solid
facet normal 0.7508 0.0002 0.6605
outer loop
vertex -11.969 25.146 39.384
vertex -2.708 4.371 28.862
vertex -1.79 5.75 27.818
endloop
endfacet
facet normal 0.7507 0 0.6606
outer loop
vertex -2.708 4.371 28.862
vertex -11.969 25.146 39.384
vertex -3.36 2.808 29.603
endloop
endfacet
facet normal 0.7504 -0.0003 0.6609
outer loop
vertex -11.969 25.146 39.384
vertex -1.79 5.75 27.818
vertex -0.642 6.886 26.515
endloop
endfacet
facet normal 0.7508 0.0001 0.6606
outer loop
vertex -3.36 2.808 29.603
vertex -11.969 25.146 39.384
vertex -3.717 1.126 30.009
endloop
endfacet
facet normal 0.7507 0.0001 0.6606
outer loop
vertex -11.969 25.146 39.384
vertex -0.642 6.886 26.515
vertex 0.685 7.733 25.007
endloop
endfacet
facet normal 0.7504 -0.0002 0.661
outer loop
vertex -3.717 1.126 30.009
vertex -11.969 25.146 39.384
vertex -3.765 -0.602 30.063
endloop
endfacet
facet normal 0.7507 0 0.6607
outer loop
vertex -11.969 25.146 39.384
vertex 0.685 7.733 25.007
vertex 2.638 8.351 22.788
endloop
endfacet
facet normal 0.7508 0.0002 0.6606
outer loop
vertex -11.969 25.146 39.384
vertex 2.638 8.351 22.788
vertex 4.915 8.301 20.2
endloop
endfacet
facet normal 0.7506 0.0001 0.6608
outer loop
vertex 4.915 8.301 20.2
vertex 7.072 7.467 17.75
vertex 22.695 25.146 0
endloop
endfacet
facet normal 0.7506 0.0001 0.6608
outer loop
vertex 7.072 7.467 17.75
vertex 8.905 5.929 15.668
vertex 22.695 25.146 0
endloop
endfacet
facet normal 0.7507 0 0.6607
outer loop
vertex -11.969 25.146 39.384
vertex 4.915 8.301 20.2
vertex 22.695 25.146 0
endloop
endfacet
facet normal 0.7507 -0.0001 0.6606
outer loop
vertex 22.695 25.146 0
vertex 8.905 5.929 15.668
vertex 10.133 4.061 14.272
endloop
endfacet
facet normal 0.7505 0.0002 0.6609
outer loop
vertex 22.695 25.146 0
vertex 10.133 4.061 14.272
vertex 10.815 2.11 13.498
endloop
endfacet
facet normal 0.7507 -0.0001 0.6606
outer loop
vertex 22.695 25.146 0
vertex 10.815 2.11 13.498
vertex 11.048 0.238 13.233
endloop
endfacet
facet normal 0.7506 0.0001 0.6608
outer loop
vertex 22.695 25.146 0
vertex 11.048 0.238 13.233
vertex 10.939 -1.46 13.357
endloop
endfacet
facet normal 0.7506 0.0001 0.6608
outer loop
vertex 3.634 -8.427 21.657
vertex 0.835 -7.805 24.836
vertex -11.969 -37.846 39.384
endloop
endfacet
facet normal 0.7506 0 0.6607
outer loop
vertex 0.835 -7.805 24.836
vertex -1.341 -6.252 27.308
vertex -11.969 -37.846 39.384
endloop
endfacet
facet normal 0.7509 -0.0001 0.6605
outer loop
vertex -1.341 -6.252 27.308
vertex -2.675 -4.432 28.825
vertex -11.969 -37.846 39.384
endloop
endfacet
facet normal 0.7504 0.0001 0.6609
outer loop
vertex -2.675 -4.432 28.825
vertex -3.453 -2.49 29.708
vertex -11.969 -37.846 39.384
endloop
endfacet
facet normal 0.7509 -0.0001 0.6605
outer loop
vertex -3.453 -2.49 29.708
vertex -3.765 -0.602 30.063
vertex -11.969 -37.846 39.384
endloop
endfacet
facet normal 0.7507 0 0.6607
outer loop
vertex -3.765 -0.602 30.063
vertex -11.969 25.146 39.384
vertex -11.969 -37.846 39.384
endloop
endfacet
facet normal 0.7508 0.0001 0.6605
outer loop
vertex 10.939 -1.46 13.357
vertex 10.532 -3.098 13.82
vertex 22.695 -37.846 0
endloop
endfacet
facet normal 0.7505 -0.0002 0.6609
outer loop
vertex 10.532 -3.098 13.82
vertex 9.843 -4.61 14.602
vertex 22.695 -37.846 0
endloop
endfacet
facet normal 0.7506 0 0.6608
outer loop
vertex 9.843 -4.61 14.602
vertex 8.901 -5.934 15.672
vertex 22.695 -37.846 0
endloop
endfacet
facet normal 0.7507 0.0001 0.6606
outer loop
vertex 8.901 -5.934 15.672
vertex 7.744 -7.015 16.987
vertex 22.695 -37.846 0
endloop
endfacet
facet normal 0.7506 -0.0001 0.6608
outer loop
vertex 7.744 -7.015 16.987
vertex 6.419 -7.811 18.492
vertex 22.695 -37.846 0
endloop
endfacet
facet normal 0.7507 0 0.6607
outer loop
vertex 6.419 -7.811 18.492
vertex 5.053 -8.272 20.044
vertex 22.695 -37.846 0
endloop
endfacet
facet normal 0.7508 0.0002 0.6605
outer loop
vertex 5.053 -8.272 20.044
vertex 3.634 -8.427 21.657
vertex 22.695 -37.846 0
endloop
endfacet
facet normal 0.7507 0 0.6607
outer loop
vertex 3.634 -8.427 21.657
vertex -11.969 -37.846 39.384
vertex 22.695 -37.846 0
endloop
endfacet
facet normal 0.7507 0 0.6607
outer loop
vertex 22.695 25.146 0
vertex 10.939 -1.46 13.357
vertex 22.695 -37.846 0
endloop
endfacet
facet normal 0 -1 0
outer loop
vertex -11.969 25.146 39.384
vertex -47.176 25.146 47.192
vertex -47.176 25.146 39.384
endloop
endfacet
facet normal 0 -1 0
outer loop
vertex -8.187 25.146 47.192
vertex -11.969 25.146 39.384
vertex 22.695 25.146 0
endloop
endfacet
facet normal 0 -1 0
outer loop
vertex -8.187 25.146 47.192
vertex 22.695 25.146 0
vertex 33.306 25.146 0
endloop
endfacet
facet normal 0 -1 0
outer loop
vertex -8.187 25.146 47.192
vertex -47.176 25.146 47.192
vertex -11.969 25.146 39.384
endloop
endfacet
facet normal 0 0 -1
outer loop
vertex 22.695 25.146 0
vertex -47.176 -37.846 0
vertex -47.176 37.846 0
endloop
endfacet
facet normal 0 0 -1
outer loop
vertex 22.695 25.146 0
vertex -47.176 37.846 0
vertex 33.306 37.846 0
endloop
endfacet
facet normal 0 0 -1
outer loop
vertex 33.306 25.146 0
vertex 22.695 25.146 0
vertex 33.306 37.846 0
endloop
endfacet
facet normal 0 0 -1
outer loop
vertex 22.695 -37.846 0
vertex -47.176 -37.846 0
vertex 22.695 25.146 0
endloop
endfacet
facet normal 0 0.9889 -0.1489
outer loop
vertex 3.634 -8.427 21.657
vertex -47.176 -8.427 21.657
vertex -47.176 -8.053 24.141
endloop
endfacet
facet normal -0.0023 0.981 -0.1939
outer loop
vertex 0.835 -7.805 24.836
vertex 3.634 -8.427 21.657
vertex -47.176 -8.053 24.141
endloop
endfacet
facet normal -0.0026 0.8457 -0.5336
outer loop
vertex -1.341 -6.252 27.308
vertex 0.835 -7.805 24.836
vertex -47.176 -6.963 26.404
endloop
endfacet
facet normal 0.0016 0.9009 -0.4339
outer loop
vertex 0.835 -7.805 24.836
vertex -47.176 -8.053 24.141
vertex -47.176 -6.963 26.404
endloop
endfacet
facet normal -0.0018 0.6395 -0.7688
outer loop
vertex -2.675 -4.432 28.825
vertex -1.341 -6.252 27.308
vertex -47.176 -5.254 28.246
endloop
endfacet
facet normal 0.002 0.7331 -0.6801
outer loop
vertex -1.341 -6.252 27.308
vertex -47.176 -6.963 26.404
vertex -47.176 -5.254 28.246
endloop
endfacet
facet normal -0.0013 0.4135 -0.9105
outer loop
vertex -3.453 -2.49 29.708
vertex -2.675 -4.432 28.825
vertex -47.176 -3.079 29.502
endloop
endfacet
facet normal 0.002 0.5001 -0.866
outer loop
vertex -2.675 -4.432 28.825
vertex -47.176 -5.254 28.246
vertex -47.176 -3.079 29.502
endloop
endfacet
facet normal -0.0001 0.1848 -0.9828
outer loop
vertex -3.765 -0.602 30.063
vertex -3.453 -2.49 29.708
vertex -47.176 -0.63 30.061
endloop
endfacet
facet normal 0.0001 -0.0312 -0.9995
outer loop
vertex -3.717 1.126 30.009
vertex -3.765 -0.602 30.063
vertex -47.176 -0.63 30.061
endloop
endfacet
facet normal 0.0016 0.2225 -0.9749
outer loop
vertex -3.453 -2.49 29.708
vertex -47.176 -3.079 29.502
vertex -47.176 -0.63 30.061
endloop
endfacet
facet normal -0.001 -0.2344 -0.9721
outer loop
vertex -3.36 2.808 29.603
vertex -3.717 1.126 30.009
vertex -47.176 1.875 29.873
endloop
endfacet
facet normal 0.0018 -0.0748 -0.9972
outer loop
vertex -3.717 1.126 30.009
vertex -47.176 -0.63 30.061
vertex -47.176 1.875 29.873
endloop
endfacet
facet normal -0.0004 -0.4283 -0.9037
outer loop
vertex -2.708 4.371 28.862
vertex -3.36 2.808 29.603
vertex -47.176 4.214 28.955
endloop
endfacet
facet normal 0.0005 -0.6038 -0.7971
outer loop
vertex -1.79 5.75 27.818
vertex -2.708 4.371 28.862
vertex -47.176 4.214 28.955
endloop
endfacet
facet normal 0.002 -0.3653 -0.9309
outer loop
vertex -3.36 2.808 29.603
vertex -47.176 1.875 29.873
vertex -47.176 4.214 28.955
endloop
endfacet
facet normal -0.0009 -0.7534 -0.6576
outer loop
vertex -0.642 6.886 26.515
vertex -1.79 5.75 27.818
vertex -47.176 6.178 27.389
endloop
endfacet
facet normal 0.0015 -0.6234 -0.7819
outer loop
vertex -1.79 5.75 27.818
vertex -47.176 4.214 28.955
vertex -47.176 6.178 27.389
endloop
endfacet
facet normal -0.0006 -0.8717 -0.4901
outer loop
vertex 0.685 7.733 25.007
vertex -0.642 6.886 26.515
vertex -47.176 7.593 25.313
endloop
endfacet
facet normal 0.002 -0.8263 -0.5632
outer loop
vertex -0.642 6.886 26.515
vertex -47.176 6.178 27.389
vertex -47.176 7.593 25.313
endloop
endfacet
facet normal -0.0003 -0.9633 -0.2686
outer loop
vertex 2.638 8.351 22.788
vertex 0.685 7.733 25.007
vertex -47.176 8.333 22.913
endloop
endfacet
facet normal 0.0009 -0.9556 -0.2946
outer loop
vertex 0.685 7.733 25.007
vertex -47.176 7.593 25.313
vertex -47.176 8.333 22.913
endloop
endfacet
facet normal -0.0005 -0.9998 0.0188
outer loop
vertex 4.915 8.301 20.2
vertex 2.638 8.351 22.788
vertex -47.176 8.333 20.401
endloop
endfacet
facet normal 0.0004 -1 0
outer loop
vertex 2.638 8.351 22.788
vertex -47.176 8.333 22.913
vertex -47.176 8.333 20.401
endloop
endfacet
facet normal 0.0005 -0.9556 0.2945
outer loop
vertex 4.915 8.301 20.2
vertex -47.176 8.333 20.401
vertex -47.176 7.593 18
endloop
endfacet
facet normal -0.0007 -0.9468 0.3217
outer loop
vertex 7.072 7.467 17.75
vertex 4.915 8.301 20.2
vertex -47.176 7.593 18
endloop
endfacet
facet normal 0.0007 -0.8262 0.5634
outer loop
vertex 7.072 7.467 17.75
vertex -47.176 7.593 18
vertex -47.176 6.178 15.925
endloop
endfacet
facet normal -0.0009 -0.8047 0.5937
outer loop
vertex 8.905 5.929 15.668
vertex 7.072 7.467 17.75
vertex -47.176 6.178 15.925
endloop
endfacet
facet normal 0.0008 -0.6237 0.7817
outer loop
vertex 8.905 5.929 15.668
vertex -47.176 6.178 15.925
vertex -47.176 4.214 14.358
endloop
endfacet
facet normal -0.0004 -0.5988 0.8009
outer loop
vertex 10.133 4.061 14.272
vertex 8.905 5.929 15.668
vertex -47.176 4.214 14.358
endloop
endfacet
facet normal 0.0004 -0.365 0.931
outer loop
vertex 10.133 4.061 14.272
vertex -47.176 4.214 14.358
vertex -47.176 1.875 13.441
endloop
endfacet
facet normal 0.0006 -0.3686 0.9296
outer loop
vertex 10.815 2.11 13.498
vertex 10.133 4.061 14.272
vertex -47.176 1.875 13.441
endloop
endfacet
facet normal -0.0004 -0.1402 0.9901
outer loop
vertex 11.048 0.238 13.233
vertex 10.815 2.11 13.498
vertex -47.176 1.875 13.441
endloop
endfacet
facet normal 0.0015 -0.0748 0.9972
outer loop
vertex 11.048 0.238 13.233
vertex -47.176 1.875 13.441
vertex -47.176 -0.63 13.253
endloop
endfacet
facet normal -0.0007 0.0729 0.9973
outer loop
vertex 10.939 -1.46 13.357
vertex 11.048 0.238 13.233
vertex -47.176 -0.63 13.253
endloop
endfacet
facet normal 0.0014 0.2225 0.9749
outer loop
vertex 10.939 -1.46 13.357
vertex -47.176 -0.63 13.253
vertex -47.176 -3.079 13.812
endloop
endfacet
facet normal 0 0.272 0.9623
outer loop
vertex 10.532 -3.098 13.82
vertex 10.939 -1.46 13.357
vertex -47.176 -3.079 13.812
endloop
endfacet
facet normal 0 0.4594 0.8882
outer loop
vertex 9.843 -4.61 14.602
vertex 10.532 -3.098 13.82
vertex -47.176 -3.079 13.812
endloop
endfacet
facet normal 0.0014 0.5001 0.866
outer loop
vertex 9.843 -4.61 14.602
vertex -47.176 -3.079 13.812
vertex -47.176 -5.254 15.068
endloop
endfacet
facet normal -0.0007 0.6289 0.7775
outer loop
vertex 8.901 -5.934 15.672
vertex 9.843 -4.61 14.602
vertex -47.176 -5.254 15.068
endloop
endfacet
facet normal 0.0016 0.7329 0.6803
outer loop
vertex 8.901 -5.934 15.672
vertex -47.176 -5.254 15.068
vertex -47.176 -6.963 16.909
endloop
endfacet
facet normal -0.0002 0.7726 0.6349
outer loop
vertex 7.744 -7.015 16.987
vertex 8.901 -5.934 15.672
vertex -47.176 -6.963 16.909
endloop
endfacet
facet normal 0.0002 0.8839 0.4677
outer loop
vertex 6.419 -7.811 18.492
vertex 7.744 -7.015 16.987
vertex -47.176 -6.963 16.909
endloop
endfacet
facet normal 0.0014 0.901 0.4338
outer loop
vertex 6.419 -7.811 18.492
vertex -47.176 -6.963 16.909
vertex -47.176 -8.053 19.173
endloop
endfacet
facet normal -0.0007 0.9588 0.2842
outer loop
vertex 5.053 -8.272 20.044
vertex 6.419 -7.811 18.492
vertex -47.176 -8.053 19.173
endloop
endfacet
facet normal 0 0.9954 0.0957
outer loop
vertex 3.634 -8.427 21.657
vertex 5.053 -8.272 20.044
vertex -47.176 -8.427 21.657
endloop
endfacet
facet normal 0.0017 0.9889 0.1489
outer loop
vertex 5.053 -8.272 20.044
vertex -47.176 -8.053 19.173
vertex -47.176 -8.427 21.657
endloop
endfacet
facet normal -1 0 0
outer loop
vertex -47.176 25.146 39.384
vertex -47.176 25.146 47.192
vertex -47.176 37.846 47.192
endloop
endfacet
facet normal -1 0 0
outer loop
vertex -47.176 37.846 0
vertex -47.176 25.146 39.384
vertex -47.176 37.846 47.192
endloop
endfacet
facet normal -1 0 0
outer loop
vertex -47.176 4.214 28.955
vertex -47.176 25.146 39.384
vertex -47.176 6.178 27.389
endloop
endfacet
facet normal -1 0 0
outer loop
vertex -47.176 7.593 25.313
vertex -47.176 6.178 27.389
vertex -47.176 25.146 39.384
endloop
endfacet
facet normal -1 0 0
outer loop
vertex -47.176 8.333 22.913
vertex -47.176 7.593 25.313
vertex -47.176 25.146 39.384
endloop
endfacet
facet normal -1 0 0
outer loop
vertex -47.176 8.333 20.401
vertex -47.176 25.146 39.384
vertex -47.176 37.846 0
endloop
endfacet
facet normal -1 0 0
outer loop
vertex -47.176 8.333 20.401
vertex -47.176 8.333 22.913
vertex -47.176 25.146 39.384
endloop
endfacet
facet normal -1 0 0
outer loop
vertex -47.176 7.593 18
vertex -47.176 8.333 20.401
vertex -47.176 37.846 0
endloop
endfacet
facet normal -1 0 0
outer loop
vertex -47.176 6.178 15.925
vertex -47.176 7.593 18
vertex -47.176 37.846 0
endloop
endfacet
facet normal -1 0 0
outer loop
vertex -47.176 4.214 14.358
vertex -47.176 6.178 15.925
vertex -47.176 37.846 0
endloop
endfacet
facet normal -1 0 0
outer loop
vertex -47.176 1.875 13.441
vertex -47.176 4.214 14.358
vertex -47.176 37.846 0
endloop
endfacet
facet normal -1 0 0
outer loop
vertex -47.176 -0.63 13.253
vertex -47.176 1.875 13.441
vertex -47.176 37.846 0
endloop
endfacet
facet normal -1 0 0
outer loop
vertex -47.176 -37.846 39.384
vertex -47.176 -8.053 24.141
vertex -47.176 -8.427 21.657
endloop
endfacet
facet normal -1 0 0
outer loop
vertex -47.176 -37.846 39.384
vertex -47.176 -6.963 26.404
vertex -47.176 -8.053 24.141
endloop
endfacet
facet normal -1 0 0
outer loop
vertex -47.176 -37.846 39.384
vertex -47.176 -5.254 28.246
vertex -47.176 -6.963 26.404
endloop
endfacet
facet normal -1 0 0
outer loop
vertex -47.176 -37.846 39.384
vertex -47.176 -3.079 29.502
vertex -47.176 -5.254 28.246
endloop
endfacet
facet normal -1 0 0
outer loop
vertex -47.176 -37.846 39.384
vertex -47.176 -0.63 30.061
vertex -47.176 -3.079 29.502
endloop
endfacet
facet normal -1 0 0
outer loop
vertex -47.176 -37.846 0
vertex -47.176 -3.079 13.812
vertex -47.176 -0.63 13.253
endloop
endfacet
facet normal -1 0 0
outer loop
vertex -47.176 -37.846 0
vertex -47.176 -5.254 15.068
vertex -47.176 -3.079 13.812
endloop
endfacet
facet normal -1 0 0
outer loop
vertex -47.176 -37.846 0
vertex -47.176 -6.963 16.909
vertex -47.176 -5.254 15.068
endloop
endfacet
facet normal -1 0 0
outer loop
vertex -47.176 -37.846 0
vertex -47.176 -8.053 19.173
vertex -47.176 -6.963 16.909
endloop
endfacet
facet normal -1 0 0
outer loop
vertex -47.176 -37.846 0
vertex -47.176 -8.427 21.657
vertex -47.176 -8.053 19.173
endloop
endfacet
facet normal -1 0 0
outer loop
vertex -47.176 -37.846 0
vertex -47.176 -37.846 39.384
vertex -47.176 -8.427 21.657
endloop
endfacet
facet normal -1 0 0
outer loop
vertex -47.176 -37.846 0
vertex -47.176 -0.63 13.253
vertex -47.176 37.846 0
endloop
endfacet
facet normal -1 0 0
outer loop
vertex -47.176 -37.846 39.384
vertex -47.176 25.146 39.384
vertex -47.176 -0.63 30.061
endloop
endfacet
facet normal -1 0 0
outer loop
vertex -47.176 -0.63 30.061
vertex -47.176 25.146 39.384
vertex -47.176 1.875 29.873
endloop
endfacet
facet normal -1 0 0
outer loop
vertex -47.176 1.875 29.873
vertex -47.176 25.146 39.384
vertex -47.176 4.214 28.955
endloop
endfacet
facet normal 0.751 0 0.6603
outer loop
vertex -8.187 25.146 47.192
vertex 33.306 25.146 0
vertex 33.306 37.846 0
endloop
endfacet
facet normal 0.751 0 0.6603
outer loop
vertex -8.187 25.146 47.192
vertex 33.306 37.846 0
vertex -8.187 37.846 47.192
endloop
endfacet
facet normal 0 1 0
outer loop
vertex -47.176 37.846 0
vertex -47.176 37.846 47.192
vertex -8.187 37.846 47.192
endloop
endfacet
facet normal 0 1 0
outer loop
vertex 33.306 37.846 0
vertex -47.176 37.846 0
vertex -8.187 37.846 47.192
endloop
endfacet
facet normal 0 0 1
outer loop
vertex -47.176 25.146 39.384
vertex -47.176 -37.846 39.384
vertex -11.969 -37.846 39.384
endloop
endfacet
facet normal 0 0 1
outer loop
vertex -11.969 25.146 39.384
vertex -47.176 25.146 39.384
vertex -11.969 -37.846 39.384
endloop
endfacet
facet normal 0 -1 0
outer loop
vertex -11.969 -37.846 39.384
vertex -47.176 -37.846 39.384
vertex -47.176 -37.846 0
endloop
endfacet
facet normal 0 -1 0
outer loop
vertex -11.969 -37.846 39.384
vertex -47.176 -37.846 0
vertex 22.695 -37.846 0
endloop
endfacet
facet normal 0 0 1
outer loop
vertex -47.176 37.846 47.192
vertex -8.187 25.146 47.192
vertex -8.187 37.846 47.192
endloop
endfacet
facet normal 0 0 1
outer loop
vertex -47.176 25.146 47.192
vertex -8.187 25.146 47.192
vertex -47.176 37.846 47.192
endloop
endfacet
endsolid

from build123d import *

# Parameters (mm, degrees)
F1_DEPTH = 37.846
F3_DEPTH = 62.992
F4_R     = 8.427475
F5_DEPTH = 74.168


with BuildPart() as f1:
    # F0 (on Front) → F1 (new body, symmetric)
    with BuildSketch(Plane.XZ):
        Polygon((-47.176249, 47.191884), (-47.176249, 0), (33.306468, 0), (-8.186842, 47.191884), align=None)
    extrude(amount=F1_DEPTH, both=True)

    # F2 (on face) → F3 (cut)
    with BuildSketch(Plane.XZ.offset(37.846)):
        Polygon((-47.176249, 47.191884), (-47.176249, 39.384045), (-11.969197, 39.384045), (22.694981, 0), (33.306468, 0), (-8.186842, 47.191884), align=None)
    extrude(amount=-F3_DEPTH, mode=Mode.SUBTRACT)

    # F4 (on face) → F5 (cut)
    with BuildSketch(Plane(origin=(-47.176249, 0, 0), x_dir=(0, -1, 0), z_dir=(-1, 0, 0))):
        with Locations((0, 21.656843)):
            Circle(F4_R)
    extrude(amount=-F5_DEPTH, mode=Mode.SUBTRACT)


solid = f1.part
